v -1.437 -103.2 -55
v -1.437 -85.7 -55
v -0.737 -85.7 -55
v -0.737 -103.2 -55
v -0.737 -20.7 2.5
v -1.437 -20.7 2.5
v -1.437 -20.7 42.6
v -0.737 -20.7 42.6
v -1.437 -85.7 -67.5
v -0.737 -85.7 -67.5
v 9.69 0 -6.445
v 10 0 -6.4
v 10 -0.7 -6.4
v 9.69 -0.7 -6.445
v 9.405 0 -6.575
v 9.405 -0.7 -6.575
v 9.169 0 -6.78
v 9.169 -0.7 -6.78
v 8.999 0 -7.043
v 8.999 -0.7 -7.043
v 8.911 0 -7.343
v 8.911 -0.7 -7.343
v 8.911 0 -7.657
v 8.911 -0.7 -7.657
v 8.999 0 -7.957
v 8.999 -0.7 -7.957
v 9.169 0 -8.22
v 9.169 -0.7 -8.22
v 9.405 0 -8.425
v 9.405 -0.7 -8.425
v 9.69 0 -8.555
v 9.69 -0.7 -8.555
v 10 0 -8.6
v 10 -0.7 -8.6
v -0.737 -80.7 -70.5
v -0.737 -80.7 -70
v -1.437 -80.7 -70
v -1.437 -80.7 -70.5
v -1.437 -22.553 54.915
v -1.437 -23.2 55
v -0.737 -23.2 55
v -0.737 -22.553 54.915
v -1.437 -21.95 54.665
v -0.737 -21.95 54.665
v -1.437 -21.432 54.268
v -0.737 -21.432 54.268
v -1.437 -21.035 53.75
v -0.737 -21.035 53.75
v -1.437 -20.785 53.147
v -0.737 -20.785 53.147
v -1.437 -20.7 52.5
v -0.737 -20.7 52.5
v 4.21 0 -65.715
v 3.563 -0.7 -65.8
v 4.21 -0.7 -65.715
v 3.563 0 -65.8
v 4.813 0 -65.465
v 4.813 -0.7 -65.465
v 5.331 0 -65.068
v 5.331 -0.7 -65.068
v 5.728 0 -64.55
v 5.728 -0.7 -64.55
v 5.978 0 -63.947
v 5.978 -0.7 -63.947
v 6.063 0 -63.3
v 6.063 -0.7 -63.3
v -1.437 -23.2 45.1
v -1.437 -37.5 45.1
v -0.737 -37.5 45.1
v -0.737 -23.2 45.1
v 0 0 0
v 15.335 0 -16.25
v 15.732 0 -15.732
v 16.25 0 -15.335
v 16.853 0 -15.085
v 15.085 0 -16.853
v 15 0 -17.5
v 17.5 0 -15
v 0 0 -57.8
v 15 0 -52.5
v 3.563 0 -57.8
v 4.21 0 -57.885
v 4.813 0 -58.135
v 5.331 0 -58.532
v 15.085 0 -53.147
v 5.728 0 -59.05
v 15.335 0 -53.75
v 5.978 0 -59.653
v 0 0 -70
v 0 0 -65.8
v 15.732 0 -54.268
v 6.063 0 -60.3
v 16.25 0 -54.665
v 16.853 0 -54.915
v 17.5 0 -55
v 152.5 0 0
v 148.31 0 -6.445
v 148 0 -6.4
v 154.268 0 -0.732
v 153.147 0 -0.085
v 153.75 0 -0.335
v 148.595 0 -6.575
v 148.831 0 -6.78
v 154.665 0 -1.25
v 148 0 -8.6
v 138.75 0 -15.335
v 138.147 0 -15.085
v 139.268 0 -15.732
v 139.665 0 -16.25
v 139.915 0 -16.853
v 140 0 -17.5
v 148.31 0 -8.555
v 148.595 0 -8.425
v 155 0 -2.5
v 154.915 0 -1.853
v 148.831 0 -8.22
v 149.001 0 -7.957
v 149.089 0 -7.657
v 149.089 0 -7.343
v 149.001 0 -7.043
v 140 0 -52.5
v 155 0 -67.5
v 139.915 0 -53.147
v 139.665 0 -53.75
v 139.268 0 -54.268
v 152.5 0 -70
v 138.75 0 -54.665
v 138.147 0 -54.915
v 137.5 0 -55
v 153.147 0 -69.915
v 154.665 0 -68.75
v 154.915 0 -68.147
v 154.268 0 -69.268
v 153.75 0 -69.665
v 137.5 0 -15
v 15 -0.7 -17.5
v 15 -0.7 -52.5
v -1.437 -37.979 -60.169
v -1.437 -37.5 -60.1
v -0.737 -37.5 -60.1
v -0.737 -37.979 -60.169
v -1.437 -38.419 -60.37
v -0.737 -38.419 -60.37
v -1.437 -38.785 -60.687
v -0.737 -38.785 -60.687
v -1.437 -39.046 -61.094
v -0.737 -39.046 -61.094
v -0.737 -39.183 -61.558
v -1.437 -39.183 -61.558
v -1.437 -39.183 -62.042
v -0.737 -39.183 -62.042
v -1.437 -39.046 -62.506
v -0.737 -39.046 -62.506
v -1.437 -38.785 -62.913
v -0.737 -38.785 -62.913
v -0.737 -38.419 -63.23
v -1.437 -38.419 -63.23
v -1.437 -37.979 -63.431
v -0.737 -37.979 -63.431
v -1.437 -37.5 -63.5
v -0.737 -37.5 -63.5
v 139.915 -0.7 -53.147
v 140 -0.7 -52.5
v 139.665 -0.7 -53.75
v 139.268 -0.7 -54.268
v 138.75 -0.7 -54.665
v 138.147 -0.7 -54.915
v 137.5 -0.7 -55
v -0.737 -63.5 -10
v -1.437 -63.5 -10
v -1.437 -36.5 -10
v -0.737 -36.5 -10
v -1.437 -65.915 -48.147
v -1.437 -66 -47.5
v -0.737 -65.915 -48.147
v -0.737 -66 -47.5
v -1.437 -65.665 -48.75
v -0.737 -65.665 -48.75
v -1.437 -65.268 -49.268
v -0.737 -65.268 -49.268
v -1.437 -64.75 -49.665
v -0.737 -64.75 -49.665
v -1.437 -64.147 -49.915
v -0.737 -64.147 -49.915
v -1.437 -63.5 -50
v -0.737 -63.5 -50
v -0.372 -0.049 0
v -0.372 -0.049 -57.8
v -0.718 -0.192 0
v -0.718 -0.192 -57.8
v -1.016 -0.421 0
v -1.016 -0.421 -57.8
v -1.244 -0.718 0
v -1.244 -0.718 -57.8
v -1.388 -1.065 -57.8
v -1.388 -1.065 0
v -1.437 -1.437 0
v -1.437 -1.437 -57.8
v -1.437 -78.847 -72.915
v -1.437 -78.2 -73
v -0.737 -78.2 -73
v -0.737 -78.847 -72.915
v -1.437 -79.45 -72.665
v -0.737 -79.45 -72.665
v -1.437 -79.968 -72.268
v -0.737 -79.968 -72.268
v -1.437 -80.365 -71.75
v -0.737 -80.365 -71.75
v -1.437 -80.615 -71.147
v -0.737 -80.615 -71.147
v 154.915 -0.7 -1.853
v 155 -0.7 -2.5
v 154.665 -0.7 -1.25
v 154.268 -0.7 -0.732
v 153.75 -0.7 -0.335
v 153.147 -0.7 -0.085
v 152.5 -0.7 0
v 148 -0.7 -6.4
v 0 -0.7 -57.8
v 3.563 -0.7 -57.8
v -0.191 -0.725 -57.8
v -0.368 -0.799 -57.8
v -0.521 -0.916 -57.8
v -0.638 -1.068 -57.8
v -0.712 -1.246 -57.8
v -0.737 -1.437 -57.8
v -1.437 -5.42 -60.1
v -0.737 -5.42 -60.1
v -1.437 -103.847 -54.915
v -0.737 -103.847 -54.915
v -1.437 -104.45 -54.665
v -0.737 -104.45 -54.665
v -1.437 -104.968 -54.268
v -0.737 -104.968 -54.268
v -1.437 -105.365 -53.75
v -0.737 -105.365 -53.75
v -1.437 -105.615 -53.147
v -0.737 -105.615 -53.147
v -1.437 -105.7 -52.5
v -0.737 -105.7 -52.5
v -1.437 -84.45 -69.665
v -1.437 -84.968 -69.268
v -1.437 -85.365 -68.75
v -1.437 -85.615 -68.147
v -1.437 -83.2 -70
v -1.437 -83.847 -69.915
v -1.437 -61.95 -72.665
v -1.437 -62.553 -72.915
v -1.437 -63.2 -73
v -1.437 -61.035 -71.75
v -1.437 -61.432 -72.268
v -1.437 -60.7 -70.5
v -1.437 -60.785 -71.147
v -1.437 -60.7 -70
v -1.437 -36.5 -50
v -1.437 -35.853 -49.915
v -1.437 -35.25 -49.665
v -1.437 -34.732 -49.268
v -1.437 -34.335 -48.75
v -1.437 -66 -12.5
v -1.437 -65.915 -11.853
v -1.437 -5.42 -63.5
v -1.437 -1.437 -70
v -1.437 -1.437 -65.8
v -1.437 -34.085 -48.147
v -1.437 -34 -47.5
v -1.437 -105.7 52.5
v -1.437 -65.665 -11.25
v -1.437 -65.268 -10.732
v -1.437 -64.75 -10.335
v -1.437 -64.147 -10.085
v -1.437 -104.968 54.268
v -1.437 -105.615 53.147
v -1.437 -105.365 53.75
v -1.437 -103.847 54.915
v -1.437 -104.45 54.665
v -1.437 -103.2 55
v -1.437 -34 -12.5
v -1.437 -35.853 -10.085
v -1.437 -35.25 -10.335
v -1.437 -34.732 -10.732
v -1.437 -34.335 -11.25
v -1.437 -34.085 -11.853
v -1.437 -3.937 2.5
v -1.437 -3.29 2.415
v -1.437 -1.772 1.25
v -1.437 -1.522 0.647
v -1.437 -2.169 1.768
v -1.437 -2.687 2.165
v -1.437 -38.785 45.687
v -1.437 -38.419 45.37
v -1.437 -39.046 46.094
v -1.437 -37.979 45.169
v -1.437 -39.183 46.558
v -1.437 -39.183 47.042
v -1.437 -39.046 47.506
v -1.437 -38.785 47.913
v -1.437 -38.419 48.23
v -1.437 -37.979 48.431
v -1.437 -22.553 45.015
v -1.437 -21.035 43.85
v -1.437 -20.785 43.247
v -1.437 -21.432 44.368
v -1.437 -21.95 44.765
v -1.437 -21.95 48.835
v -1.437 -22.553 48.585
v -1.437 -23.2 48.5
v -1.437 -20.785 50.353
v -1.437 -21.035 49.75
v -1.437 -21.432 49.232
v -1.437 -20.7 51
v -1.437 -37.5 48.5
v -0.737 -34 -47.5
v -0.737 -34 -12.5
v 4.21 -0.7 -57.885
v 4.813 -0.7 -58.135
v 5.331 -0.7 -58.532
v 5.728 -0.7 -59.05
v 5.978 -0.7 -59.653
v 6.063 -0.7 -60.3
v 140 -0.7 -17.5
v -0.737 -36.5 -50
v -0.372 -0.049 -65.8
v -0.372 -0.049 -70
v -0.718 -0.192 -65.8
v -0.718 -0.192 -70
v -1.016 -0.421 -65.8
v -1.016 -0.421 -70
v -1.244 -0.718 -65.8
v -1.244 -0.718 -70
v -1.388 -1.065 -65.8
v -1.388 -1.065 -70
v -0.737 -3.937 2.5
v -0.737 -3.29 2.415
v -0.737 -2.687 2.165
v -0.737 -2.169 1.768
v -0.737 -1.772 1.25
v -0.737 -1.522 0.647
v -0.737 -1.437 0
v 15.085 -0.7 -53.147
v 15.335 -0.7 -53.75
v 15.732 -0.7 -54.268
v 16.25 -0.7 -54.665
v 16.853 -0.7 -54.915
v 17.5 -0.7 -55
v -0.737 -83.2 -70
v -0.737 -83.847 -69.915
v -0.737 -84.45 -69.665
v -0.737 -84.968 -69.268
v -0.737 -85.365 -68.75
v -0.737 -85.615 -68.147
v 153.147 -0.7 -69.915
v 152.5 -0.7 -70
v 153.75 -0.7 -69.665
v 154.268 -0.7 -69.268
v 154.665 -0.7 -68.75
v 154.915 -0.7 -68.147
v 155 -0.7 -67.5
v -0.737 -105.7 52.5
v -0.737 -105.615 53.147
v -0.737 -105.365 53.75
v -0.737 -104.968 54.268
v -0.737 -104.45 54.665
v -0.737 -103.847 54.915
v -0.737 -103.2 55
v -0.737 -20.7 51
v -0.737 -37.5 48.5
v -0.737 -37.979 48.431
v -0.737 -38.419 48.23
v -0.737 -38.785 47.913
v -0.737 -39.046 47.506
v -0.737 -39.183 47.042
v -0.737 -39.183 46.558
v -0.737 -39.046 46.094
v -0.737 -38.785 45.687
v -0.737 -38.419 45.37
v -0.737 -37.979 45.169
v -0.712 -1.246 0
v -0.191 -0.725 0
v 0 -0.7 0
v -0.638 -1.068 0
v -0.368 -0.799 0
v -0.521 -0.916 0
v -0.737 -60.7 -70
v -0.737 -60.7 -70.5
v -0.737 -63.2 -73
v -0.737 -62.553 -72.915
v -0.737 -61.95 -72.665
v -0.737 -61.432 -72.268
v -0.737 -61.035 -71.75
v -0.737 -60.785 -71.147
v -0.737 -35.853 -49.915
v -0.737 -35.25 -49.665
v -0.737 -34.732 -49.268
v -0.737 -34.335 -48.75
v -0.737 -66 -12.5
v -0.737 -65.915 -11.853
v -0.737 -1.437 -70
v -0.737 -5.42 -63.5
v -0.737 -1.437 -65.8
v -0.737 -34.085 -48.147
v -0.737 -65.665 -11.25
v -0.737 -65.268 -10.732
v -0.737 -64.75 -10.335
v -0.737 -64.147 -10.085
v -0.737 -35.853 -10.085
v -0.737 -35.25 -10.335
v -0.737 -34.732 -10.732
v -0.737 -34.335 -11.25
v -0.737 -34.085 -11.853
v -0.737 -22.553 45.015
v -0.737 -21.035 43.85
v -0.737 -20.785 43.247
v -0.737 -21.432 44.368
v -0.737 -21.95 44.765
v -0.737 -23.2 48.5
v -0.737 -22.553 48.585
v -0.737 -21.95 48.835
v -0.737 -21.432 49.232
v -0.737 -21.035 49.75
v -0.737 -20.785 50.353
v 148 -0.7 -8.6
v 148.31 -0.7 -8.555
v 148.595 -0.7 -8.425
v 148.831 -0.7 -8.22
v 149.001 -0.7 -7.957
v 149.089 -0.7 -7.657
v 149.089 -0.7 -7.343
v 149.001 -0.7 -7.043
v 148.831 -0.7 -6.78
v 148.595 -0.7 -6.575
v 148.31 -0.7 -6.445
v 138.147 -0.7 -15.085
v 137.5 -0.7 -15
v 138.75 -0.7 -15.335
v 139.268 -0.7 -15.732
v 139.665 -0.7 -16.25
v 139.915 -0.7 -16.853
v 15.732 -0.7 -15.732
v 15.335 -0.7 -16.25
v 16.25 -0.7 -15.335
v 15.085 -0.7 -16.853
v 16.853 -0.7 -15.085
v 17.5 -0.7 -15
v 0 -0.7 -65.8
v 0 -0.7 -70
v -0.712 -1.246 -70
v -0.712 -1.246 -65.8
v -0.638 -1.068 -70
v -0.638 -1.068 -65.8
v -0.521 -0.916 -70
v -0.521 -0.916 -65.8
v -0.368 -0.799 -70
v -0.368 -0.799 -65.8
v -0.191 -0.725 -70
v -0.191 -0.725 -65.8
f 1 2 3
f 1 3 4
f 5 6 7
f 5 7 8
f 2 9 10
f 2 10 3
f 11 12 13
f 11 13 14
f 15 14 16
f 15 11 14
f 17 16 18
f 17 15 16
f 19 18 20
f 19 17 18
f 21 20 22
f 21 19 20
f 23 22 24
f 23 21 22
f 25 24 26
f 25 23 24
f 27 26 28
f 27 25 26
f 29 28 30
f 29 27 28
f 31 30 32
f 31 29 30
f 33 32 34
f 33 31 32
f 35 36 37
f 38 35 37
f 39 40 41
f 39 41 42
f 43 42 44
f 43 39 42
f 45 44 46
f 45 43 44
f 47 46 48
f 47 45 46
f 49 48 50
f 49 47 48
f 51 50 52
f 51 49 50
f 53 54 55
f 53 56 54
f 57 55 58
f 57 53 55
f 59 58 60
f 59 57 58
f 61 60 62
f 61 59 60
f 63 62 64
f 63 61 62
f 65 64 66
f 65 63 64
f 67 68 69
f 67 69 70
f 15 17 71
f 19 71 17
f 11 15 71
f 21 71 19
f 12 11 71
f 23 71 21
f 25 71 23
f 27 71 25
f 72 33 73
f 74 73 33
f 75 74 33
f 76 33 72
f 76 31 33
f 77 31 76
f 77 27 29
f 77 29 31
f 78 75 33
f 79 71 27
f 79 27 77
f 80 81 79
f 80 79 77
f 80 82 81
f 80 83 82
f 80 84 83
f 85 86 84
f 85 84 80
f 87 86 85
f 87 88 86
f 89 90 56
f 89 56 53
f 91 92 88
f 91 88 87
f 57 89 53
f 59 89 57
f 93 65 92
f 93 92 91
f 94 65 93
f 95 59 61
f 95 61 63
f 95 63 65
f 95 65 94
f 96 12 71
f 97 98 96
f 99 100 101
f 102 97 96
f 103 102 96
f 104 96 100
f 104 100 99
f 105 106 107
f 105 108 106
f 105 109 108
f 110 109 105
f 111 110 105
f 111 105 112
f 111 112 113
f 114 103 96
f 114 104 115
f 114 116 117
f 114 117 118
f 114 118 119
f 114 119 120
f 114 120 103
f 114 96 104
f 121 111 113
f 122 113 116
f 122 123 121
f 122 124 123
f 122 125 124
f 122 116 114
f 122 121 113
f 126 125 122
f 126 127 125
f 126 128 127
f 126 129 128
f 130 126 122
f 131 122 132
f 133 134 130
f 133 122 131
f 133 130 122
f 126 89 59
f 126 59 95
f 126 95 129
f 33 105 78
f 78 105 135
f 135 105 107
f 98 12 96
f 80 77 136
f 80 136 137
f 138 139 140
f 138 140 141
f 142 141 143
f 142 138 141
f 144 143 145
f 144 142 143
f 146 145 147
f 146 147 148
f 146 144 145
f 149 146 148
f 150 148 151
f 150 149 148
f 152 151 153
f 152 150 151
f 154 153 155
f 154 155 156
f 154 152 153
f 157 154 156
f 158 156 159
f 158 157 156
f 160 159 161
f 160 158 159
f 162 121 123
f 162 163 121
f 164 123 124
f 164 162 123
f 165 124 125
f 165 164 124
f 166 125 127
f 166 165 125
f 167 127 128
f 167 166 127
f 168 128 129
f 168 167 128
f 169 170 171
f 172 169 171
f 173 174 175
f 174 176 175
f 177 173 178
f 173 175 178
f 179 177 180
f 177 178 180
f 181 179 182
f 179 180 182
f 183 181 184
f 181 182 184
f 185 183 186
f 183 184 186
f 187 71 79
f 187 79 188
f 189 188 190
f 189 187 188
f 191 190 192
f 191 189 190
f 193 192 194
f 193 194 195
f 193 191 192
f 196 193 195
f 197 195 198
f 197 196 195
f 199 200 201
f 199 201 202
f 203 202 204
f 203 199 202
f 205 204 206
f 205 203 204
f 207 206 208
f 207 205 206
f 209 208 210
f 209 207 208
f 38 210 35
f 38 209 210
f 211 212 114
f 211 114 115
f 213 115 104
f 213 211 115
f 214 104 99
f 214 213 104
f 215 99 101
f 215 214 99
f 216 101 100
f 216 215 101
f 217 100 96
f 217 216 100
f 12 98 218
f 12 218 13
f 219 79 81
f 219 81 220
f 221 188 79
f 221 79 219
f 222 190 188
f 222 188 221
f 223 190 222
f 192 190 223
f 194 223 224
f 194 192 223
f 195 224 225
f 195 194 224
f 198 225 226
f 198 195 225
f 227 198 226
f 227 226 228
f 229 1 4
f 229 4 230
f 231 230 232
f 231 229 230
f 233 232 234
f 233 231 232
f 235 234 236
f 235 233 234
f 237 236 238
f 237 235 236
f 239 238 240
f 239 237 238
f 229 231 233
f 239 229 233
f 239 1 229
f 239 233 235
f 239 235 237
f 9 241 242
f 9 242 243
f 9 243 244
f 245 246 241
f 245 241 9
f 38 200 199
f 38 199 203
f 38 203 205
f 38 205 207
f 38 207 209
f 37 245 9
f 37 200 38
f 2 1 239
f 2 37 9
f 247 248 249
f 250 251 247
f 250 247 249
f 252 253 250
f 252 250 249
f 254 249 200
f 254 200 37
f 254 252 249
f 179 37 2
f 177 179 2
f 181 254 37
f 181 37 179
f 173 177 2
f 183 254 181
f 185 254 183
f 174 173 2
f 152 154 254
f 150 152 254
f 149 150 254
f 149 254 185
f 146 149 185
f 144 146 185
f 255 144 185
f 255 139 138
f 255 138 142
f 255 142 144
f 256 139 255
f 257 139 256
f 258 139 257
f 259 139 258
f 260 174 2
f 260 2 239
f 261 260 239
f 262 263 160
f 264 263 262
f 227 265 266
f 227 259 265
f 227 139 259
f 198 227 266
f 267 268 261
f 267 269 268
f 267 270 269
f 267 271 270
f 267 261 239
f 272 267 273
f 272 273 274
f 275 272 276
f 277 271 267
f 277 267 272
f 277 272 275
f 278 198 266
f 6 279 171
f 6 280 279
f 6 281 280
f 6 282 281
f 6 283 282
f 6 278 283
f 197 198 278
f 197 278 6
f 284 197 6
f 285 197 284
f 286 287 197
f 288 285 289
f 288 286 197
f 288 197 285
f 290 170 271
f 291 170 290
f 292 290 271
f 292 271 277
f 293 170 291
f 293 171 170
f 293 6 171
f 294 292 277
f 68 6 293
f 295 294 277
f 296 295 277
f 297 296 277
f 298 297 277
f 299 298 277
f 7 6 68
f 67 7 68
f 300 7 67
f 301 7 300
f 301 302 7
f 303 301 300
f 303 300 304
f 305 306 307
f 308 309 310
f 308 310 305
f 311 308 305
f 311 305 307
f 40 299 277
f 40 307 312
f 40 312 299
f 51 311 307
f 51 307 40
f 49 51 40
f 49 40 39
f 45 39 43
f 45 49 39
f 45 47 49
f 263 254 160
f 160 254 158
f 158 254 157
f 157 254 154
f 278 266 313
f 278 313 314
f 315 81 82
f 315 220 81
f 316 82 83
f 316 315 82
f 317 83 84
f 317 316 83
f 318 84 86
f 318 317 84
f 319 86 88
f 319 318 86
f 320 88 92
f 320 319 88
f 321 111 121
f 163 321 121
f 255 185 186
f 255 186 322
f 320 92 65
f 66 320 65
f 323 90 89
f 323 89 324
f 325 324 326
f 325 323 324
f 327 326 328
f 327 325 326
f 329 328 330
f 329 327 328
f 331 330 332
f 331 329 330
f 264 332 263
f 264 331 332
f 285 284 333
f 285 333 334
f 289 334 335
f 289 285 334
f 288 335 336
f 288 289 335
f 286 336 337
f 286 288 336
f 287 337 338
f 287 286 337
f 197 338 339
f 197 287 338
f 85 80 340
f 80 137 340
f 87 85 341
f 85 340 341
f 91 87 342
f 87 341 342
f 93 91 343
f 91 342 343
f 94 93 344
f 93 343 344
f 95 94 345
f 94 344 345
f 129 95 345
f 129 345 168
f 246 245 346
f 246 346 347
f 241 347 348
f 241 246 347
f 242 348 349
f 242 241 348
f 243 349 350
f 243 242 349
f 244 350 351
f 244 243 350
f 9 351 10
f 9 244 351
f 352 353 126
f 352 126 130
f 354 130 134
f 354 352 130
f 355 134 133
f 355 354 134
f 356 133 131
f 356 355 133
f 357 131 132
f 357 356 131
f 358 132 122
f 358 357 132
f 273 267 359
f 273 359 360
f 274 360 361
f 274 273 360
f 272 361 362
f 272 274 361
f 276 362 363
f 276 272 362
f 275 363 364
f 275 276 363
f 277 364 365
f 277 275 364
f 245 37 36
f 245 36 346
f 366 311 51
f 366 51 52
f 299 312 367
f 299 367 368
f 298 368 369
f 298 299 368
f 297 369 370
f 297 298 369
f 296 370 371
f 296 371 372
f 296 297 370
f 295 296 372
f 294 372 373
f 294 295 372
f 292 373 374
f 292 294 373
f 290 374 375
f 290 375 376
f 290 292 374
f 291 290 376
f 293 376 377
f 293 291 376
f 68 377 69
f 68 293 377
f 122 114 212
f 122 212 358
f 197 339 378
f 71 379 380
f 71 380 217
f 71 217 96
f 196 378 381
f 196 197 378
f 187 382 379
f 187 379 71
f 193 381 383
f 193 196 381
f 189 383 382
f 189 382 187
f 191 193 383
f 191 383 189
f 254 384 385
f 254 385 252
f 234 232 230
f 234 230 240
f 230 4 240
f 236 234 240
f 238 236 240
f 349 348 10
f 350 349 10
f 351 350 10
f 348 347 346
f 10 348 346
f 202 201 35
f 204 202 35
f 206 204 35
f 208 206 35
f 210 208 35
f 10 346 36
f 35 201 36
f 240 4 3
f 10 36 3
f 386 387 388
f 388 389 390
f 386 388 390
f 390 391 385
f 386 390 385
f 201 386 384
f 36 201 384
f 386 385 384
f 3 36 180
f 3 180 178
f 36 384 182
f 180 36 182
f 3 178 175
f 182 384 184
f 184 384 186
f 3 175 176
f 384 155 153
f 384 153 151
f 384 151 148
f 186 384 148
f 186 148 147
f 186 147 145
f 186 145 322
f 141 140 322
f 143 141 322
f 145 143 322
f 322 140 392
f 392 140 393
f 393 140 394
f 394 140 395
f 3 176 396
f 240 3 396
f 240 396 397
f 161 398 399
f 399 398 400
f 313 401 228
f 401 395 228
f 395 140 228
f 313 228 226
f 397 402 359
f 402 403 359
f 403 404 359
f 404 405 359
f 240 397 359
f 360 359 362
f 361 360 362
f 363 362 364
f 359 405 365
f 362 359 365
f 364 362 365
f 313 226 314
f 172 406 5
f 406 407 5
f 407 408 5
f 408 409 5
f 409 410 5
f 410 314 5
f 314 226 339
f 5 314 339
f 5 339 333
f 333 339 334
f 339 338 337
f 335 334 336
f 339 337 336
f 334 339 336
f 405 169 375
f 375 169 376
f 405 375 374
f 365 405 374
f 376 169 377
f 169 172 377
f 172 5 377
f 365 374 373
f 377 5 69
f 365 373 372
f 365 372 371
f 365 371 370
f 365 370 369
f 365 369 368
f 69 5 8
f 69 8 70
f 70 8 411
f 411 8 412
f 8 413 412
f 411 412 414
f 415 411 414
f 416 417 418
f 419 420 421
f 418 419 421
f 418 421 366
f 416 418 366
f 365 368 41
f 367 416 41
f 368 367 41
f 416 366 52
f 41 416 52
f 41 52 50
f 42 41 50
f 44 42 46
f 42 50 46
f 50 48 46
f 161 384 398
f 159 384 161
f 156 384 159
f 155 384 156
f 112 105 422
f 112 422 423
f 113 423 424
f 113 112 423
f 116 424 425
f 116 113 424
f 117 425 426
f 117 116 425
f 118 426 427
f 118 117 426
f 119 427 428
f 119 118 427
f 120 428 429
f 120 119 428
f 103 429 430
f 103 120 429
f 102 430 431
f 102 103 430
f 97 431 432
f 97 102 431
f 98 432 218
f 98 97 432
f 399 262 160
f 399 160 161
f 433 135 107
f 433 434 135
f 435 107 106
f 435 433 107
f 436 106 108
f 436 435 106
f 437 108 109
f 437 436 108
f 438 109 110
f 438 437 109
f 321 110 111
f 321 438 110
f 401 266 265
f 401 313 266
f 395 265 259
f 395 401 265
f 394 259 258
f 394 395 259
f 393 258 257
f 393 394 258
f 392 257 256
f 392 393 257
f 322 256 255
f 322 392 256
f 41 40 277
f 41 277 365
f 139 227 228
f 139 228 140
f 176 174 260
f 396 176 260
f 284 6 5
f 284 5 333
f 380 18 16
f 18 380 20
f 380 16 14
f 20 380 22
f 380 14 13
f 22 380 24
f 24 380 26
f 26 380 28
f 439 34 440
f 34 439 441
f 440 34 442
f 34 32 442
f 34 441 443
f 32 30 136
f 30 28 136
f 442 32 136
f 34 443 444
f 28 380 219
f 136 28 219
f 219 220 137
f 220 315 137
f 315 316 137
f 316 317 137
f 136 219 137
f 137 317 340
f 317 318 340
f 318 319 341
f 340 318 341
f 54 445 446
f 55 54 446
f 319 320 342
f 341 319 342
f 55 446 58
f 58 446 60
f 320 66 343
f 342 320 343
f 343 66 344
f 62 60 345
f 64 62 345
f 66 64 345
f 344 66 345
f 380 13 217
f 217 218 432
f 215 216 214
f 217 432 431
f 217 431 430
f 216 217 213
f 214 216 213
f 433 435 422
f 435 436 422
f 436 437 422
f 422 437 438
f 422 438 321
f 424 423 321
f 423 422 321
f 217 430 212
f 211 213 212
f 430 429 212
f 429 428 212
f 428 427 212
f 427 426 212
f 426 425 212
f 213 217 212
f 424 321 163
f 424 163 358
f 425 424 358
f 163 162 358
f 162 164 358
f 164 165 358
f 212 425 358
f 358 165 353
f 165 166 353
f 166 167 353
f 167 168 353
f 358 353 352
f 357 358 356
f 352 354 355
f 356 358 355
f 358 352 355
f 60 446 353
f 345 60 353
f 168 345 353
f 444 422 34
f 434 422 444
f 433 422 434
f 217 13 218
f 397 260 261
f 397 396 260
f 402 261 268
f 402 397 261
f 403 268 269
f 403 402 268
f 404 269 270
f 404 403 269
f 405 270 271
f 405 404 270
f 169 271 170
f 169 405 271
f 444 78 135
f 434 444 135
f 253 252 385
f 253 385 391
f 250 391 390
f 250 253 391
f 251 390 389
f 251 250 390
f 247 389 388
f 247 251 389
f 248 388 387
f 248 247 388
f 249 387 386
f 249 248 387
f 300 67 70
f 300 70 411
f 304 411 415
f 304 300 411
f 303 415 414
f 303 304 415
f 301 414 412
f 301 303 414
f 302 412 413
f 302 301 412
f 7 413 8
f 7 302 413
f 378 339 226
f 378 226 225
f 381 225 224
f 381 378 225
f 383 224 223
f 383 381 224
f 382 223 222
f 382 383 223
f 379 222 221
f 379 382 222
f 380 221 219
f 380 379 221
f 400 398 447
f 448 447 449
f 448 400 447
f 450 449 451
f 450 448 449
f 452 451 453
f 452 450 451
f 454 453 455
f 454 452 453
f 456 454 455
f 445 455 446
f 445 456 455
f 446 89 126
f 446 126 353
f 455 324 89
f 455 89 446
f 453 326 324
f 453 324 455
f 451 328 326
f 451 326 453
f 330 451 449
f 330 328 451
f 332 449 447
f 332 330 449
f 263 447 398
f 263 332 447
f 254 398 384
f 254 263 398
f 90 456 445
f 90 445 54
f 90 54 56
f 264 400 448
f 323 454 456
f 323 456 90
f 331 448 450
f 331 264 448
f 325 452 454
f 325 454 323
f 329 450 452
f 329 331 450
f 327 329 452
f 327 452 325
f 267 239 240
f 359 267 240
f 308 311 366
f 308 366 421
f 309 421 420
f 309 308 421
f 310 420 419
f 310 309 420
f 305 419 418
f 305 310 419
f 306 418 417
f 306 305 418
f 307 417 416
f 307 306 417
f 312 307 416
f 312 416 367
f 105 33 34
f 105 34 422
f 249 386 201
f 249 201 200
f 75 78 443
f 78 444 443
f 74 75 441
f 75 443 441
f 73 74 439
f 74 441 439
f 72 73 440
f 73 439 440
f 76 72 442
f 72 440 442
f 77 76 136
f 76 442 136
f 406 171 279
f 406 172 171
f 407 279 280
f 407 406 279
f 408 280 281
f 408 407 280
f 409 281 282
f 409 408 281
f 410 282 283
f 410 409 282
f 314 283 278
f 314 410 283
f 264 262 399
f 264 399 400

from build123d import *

# Parameters (mm, degrees)
SKETCH1_W               = 125
SKETCH1_H               = 40
BASE_FLANGE1_DEPTH      = 0.7
CUT_EXTRUDE3_DEPTH      = 10
EDGE_FLANGE5_DEPTH      = 70
EDGE_FLANGE5_START      = 0.7
EDGE_FLANGE5_FLAT_DEPTH = 0.7
SKETCH26_W              = 0.7
SKETCH26_H              = 85
BOSS_EXTRUDE1_DEPTH     = 55
SKETCH27_W              = 0.7
SKETCH27_H              = 20
BOSS_EXTRUDE2_DEPTH     = 3
CUT_EXTRUDE4_START      = -63.5
CUT_EXTRUDE4_DEPTH      = 3.4
CUT_EXTRUDE4_START_2    = -1.4366
CUT_EXTRUDE4_2_DEPTH    = 0.7
SKETCH30_W              = 2.5
SKETCH30_H              = 19.2634
TAB1_DEPTH              = 0.7
BREAK_CORNER1_START     = -2
BREAK_CORNER1_DEPTH     = 2
BREAK_CORNER1_2_DEPTH   = 3
CUT_EXTRUDE5_DEPTH      = 7.5
SKETCH32_W              = 40
SKETCH32_H              = 32
CUT_EXTRUDE6_DEPTH      = 0.7
FILLET1_R               = 2.5


with BuildPart() as part:
    # Base-Flange1: sheet metal written as solids
    # Sketch1 → Base-Flange1 (new body)
    with BuildSketch(Plane(origin=(0, 0, 0), x_dir=(1, 0, 0), z_dir=(0, 1, 0))):
        Polygon((0, 0), (155, 0), (155, 70), (0, 70), (0, 55), (0, 15), align=None)
        with Locations((77.5, 35)):
            Rectangle(SKETCH1_W, SKETCH1_H, mode=Mode.SUBTRACT)
    extrude(amount=-BASE_FLANGE1_DEPTH)

    # Sketch22 → Cut-Extrude3 (cut)
    with BuildSketch(Plane(origin=(0, 0, 0), x_dir=(1, 0, 0), z_dir=(0, 1, 0))):
        with BuildLine():
            Line((10, 8.6), (148, 8.6))
            ThreePointArc((148, 8.6), (149.1, 7.5), (148, 6.4))
            Line((148, 6.4), (10, 6.4))
            ThreePointArc((10, 6.4), (8.9, 7.5), (10, 8.6))
        make_face()
    extrude(amount=-CUT_EXTRUDE3_DEPTH, mode=Mode.SUBTRACT)

    # Edge-Flange5: sheet metal written as solids
    # Edge-Flange5 bend section (on a plane across the edge) → Edge-Flange5 (add)
    with BuildSketch(Plane(origin=(-0.7366, -0.7, 0), x_dir=(1, 0, 0), z_dir=(0, 0, -1))):
        with BuildLine():
            Line((-0.7, 0.7366), (0, 0.7366))
            ThreePointArc((0, 0.7366), (0.215745145, 0.215745145), (0.7366, 0))
            Line((0.7366, 0), (0.7366, -0.7))
            ThreePointArc((0.7366, -0.7), (-0.279229602, -0.279229602), (-0.7, 0.7366))
        make_face()
    extrude(amount=EDGE_FLANGE5_DEPTH)

    # Edge-Flange5 profile (on flange) → Edge-Flange5 flat (add)
    with BuildSketch(Plane(origin=(-0.7366, -0.7, 0), x_dir=(0, 0, -1), z_dir=(-1, 0, 0)).offset(EDGE_FLANGE5_START)):
        Polygon((70, 0.7366), (70, 85), (55, 85), (55, 105), (0, 105), (0, 0.7366), align=None)
    extrude(amount=-EDGE_FLANGE5_FLAT_DEPTH)

    # Sketch26 → Boss-Extrude1 (add)
    with BuildSketch(Plane.XY):
        with Locations((-1.0866, -63.2)):
            Rectangle(SKETCH26_W, SKETCH26_H)
    extrude(amount=BOSS_EXTRUDE1_DEPTH)

    # Sketch27 → Boss-Extrude2 (add)
    with BuildSketch(Plane(origin=(0, 0, -70), x_dir=(-1, 0, 0), z_dir=(0, 0, -1))):
        with Locations((1.0866, -70.7)):
            Rectangle(SKETCH27_W, SKETCH27_H)
    extrude(amount=BOSS_EXTRUDE2_DEPTH)

    # Cut-Extrude4: read off the stored shape, not the designer's step
    # Cut-Extrude4 outline → Cut-Extrude4 (cut)
    with BuildSketch(Plane.XY.offset(CUT_EXTRUDE4_START)):
        with BuildLine():
            ThreePointArc((-0.7366, -1.4366), (-0.640617257, -1.073021825), (-0.377683113, -0.804195836))
            Line((-0.377683113, -0.804195836), (-0.7366, -0.203214415))
            ThreePointArc((-0.7366, -0.203214415), (-1.249403682, -0.727509033), (-1.4366, -1.4366))
            Line((-1.4366, -1.4366), (-1.4366, -20.7))
            Line((-1.4366, -20.7), (-0.7366, -20.7))
            Line((-0.7366, -20.7), (-0.7366, -1.4366))
        make_face()
    extrude(amount=CUT_EXTRUDE4_DEPTH, mode=Mode.SUBTRACT)

    # Cut-Extrude4 2 outline → Cut-Extrude4 2 (cut)
    with BuildSketch(Plane.YZ.offset(CUT_EXTRUDE4_START_2)):
        with BuildLine():
            Line((-20.7, -60.1), (-37.5, -60.1))
            ThreePointArc((-37.5, -60.1), (-39.2, -61.8), (-37.5, -63.5))
            Line((-37.5, -63.5), (-20.7, -63.5))
            Line((-20.7, -63.5), (-20.7, -60.1))
        make_face()
        with BuildLine():
            Line((-20.7, 48.5), (-37.5, 48.5))
            ThreePointArc((-37.5, 48.5), (-39.2, 46.8), (-37.5, 45.1))
            Line((-37.5, 45.1), (-20.7, 45.1))
            Line((-20.7, 45.1), (-20.7, 48.5))
        make_face()
    extrude(amount=CUT_EXTRUDE4_2_DEPTH, mode=Mode.SUBTRACT)

    # Tab1: sheet metal written as solids
    # Sketch30 → Tab1 (add)
    with BuildSketch(Plane.ZY.offset(1.4366)):
        with Locations((1.25, -11.0683)):
            Rectangle(SKETCH30_W, SKETCH30_H)
    extrude(amount=-TAB1_DEPTH)

    # Break-Corner1: read off the stored shape, not the designer's step
    # Break-Corner1 outline → Break-Corner1 (cut)
    with BuildSketch(Plane.YZ.offset(BREAK_CORNER1_START)):
        with BuildLine():
            Line((-105.7, 55), (-105.7, 52.5))
            ThreePointArc((-105.7, 52.5), (-104.967766953, 54.267766953), (-103.2, 55))
            Line((-103.2, 55), (-105.7, 55))
        make_face()
        with BuildLine():
            ThreePointArc((-60.7, -70.5), (-61.432233047, -72.267766953), (-63.2, -73))
            Line((-63.2, -73), (-60.7, -73))
            Line((-60.7, -73), (-60.7, -70.5))
        make_face()
        with BuildLine():
            ThreePointArc((-78.2, -73), (-79.967766953, -72.267766953), (-80.7, -70.5))
            Line((-80.7, -70.5), (-80.7, -73))
            Line((-80.7, -73), (-78.2, -73))
        make_face()
        with BuildLine():
            ThreePointArc((-83.2, -70), (-84.967766953, -69.267766953), (-85.7, -67.5))
            Line((-85.7, -67.5), (-85.7, -70))
            Line((-85.7, -70), (-83.2, -70))
        make_face()
        with BuildLine():
            ThreePointArc((-103.2, -55), (-104.967766953, -54.267766953), (-105.7, -52.5))
            Line((-105.7, -52.5), (-105.7, -55))
            Line((-105.7, -55), (-103.2, -55))
        make_face()
        with BuildLine():
            Line((-20.7, 48.5), (-20.7, 51))
            ThreePointArc((-20.7, 51), (-21.432233047, 49.232233047), (-23.2, 48.5))
            Line((-23.2, 48.5), (-20.7, 48.5))
        make_face()
        with BuildLine():
            Line((-20.7, 55), (-23.2, 55))
            ThreePointArc((-23.2, 55), (-21.432233047, 54.267766953), (-20.7, 52.5))
            Line((-20.7, 52.5), (-20.7, 55))
        make_face()
        with BuildLine():
            Line((-20.7, 45.1), (-23.2, 45.1))
            ThreePointArc((-23.2, 45.1), (-21.432233047, 44.367766953), (-20.7, 42.6))
            Line((-20.7, 42.6), (-20.7, 45.1))
        make_face()
        with BuildLine():
            Line((-1.4366, 2.5), (-3.9366, 2.5))
            ThreePointArc((-3.9366, 2.5), (-2.168833047, 1.767766953), (-1.4366, 0))
            Line((-1.4366, 0), (-1.4366, 2.5))
        make_face()
    extrude(amount=BREAK_CORNER1_DEPTH, mode=Mode.SUBTRACT)

    # Break-Corner1 2 outline → Break-Corner1 2 (cut)
    with BuildSketch(Plane(origin=(0, 0, 0), x_dir=(1, 0, 0), z_dir=(0, 1, 0)).offset(BREAK_CORNER1_START)):
        with BuildLine():
            Line((155, 0), (155, 2.5))
            ThreePointArc((155, 2.5), (154.267766953, 0.732233047), (152.5, 0))
            Line((152.5, 0), (155, 0))
        make_face()
        with BuildLine():
            ThreePointArc((152.5, 70), (154.267766953, 69.267766953), (155, 67.5))
            Line((155, 67.5), (155, 70))
            Line((155, 70), (152.5, 70))
        make_face()
    extrude(amount=BREAK_CORNER1_2_DEPTH, mode=Mode.SUBTRACT)

    # Sketch31 → Cut-Extrude5 (cut)
    with BuildSketch(Plane.ZY.offset(1.4366)):
        Polygon((-60.1, -5.420316857), (-63.5, -5.420316857), (-65.8, -1.4366), (-65.8, 0), (-57.8, 0), (-57.8, -1.4366), align=None)
    extrude(amount=-CUT_EXTRUDE5_DEPTH, mode=Mode.SUBTRACT)

    # Sketch32 → Cut-Extrude6 (cut)
    with BuildSketch(Plane.ZY.offset(1.4366)):
        with Locations((-30, -50)):
            Rectangle(SKETCH32_W, SKETCH32_H)
    extrude(amount=-CUT_EXTRUDE6_DEPTH, mode=Mode.SUBTRACT)

    # Fillet1
    fillet1_edges = [part.edges().sort_by_distance(p)[0] for p in [
        (15, -0.35, -55),
        (140, -0.35, -55),
        (140, -0.35, -15),
        (15, -0.35, -15),
        (6.0634, -0.35, -57.8),
        (6.0634, -0.35, -65.8),
        (-1.0866, -34, -10),
        (-1.0866, -66, -10),
        (-1.0866, -66, -50),
        (-1.0866, -34, -50),
    ]]
    fillet(fillet1_edges, radius=FILLET1_R)


solid = part.part
